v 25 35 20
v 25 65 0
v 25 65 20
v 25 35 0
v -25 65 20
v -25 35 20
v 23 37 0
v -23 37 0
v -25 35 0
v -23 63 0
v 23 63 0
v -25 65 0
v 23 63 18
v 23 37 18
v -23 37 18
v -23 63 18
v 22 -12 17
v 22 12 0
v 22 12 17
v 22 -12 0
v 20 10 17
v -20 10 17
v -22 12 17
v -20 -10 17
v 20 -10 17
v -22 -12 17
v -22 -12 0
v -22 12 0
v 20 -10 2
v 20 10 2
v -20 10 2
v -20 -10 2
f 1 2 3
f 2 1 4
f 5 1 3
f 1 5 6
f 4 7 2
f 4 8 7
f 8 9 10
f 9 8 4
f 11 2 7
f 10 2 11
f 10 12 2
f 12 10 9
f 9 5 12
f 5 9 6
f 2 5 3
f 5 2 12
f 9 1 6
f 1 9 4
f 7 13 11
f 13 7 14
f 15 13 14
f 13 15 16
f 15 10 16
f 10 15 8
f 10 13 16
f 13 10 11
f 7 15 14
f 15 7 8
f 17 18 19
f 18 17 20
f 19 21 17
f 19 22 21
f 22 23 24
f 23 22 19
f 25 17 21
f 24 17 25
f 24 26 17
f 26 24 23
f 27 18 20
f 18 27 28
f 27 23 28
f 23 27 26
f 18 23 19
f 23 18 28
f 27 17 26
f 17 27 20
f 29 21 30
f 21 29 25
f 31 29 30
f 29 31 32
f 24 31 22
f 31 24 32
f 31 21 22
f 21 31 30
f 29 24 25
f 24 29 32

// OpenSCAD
union(){
  translate(v=[0, 50, 0])
    difference(){
      translate(v=[-25, -15, 0])
        cube(size=[50, 30, 20]);
      #
      translate(v=[0, 0, -0.1])
        translate(v=[-23, -13, 0])
          cube(size=[46, 26, 18.1]);
    }
  difference(){
    translate(v=[-22, -12, 0])
      cube(size=[44, 24, 17]);
    #
    translate(v=[0, 0, 2])
      translate(v=[-20, -10, 0])
        cube(size=[40, 20, 15.1]);
  }
}
